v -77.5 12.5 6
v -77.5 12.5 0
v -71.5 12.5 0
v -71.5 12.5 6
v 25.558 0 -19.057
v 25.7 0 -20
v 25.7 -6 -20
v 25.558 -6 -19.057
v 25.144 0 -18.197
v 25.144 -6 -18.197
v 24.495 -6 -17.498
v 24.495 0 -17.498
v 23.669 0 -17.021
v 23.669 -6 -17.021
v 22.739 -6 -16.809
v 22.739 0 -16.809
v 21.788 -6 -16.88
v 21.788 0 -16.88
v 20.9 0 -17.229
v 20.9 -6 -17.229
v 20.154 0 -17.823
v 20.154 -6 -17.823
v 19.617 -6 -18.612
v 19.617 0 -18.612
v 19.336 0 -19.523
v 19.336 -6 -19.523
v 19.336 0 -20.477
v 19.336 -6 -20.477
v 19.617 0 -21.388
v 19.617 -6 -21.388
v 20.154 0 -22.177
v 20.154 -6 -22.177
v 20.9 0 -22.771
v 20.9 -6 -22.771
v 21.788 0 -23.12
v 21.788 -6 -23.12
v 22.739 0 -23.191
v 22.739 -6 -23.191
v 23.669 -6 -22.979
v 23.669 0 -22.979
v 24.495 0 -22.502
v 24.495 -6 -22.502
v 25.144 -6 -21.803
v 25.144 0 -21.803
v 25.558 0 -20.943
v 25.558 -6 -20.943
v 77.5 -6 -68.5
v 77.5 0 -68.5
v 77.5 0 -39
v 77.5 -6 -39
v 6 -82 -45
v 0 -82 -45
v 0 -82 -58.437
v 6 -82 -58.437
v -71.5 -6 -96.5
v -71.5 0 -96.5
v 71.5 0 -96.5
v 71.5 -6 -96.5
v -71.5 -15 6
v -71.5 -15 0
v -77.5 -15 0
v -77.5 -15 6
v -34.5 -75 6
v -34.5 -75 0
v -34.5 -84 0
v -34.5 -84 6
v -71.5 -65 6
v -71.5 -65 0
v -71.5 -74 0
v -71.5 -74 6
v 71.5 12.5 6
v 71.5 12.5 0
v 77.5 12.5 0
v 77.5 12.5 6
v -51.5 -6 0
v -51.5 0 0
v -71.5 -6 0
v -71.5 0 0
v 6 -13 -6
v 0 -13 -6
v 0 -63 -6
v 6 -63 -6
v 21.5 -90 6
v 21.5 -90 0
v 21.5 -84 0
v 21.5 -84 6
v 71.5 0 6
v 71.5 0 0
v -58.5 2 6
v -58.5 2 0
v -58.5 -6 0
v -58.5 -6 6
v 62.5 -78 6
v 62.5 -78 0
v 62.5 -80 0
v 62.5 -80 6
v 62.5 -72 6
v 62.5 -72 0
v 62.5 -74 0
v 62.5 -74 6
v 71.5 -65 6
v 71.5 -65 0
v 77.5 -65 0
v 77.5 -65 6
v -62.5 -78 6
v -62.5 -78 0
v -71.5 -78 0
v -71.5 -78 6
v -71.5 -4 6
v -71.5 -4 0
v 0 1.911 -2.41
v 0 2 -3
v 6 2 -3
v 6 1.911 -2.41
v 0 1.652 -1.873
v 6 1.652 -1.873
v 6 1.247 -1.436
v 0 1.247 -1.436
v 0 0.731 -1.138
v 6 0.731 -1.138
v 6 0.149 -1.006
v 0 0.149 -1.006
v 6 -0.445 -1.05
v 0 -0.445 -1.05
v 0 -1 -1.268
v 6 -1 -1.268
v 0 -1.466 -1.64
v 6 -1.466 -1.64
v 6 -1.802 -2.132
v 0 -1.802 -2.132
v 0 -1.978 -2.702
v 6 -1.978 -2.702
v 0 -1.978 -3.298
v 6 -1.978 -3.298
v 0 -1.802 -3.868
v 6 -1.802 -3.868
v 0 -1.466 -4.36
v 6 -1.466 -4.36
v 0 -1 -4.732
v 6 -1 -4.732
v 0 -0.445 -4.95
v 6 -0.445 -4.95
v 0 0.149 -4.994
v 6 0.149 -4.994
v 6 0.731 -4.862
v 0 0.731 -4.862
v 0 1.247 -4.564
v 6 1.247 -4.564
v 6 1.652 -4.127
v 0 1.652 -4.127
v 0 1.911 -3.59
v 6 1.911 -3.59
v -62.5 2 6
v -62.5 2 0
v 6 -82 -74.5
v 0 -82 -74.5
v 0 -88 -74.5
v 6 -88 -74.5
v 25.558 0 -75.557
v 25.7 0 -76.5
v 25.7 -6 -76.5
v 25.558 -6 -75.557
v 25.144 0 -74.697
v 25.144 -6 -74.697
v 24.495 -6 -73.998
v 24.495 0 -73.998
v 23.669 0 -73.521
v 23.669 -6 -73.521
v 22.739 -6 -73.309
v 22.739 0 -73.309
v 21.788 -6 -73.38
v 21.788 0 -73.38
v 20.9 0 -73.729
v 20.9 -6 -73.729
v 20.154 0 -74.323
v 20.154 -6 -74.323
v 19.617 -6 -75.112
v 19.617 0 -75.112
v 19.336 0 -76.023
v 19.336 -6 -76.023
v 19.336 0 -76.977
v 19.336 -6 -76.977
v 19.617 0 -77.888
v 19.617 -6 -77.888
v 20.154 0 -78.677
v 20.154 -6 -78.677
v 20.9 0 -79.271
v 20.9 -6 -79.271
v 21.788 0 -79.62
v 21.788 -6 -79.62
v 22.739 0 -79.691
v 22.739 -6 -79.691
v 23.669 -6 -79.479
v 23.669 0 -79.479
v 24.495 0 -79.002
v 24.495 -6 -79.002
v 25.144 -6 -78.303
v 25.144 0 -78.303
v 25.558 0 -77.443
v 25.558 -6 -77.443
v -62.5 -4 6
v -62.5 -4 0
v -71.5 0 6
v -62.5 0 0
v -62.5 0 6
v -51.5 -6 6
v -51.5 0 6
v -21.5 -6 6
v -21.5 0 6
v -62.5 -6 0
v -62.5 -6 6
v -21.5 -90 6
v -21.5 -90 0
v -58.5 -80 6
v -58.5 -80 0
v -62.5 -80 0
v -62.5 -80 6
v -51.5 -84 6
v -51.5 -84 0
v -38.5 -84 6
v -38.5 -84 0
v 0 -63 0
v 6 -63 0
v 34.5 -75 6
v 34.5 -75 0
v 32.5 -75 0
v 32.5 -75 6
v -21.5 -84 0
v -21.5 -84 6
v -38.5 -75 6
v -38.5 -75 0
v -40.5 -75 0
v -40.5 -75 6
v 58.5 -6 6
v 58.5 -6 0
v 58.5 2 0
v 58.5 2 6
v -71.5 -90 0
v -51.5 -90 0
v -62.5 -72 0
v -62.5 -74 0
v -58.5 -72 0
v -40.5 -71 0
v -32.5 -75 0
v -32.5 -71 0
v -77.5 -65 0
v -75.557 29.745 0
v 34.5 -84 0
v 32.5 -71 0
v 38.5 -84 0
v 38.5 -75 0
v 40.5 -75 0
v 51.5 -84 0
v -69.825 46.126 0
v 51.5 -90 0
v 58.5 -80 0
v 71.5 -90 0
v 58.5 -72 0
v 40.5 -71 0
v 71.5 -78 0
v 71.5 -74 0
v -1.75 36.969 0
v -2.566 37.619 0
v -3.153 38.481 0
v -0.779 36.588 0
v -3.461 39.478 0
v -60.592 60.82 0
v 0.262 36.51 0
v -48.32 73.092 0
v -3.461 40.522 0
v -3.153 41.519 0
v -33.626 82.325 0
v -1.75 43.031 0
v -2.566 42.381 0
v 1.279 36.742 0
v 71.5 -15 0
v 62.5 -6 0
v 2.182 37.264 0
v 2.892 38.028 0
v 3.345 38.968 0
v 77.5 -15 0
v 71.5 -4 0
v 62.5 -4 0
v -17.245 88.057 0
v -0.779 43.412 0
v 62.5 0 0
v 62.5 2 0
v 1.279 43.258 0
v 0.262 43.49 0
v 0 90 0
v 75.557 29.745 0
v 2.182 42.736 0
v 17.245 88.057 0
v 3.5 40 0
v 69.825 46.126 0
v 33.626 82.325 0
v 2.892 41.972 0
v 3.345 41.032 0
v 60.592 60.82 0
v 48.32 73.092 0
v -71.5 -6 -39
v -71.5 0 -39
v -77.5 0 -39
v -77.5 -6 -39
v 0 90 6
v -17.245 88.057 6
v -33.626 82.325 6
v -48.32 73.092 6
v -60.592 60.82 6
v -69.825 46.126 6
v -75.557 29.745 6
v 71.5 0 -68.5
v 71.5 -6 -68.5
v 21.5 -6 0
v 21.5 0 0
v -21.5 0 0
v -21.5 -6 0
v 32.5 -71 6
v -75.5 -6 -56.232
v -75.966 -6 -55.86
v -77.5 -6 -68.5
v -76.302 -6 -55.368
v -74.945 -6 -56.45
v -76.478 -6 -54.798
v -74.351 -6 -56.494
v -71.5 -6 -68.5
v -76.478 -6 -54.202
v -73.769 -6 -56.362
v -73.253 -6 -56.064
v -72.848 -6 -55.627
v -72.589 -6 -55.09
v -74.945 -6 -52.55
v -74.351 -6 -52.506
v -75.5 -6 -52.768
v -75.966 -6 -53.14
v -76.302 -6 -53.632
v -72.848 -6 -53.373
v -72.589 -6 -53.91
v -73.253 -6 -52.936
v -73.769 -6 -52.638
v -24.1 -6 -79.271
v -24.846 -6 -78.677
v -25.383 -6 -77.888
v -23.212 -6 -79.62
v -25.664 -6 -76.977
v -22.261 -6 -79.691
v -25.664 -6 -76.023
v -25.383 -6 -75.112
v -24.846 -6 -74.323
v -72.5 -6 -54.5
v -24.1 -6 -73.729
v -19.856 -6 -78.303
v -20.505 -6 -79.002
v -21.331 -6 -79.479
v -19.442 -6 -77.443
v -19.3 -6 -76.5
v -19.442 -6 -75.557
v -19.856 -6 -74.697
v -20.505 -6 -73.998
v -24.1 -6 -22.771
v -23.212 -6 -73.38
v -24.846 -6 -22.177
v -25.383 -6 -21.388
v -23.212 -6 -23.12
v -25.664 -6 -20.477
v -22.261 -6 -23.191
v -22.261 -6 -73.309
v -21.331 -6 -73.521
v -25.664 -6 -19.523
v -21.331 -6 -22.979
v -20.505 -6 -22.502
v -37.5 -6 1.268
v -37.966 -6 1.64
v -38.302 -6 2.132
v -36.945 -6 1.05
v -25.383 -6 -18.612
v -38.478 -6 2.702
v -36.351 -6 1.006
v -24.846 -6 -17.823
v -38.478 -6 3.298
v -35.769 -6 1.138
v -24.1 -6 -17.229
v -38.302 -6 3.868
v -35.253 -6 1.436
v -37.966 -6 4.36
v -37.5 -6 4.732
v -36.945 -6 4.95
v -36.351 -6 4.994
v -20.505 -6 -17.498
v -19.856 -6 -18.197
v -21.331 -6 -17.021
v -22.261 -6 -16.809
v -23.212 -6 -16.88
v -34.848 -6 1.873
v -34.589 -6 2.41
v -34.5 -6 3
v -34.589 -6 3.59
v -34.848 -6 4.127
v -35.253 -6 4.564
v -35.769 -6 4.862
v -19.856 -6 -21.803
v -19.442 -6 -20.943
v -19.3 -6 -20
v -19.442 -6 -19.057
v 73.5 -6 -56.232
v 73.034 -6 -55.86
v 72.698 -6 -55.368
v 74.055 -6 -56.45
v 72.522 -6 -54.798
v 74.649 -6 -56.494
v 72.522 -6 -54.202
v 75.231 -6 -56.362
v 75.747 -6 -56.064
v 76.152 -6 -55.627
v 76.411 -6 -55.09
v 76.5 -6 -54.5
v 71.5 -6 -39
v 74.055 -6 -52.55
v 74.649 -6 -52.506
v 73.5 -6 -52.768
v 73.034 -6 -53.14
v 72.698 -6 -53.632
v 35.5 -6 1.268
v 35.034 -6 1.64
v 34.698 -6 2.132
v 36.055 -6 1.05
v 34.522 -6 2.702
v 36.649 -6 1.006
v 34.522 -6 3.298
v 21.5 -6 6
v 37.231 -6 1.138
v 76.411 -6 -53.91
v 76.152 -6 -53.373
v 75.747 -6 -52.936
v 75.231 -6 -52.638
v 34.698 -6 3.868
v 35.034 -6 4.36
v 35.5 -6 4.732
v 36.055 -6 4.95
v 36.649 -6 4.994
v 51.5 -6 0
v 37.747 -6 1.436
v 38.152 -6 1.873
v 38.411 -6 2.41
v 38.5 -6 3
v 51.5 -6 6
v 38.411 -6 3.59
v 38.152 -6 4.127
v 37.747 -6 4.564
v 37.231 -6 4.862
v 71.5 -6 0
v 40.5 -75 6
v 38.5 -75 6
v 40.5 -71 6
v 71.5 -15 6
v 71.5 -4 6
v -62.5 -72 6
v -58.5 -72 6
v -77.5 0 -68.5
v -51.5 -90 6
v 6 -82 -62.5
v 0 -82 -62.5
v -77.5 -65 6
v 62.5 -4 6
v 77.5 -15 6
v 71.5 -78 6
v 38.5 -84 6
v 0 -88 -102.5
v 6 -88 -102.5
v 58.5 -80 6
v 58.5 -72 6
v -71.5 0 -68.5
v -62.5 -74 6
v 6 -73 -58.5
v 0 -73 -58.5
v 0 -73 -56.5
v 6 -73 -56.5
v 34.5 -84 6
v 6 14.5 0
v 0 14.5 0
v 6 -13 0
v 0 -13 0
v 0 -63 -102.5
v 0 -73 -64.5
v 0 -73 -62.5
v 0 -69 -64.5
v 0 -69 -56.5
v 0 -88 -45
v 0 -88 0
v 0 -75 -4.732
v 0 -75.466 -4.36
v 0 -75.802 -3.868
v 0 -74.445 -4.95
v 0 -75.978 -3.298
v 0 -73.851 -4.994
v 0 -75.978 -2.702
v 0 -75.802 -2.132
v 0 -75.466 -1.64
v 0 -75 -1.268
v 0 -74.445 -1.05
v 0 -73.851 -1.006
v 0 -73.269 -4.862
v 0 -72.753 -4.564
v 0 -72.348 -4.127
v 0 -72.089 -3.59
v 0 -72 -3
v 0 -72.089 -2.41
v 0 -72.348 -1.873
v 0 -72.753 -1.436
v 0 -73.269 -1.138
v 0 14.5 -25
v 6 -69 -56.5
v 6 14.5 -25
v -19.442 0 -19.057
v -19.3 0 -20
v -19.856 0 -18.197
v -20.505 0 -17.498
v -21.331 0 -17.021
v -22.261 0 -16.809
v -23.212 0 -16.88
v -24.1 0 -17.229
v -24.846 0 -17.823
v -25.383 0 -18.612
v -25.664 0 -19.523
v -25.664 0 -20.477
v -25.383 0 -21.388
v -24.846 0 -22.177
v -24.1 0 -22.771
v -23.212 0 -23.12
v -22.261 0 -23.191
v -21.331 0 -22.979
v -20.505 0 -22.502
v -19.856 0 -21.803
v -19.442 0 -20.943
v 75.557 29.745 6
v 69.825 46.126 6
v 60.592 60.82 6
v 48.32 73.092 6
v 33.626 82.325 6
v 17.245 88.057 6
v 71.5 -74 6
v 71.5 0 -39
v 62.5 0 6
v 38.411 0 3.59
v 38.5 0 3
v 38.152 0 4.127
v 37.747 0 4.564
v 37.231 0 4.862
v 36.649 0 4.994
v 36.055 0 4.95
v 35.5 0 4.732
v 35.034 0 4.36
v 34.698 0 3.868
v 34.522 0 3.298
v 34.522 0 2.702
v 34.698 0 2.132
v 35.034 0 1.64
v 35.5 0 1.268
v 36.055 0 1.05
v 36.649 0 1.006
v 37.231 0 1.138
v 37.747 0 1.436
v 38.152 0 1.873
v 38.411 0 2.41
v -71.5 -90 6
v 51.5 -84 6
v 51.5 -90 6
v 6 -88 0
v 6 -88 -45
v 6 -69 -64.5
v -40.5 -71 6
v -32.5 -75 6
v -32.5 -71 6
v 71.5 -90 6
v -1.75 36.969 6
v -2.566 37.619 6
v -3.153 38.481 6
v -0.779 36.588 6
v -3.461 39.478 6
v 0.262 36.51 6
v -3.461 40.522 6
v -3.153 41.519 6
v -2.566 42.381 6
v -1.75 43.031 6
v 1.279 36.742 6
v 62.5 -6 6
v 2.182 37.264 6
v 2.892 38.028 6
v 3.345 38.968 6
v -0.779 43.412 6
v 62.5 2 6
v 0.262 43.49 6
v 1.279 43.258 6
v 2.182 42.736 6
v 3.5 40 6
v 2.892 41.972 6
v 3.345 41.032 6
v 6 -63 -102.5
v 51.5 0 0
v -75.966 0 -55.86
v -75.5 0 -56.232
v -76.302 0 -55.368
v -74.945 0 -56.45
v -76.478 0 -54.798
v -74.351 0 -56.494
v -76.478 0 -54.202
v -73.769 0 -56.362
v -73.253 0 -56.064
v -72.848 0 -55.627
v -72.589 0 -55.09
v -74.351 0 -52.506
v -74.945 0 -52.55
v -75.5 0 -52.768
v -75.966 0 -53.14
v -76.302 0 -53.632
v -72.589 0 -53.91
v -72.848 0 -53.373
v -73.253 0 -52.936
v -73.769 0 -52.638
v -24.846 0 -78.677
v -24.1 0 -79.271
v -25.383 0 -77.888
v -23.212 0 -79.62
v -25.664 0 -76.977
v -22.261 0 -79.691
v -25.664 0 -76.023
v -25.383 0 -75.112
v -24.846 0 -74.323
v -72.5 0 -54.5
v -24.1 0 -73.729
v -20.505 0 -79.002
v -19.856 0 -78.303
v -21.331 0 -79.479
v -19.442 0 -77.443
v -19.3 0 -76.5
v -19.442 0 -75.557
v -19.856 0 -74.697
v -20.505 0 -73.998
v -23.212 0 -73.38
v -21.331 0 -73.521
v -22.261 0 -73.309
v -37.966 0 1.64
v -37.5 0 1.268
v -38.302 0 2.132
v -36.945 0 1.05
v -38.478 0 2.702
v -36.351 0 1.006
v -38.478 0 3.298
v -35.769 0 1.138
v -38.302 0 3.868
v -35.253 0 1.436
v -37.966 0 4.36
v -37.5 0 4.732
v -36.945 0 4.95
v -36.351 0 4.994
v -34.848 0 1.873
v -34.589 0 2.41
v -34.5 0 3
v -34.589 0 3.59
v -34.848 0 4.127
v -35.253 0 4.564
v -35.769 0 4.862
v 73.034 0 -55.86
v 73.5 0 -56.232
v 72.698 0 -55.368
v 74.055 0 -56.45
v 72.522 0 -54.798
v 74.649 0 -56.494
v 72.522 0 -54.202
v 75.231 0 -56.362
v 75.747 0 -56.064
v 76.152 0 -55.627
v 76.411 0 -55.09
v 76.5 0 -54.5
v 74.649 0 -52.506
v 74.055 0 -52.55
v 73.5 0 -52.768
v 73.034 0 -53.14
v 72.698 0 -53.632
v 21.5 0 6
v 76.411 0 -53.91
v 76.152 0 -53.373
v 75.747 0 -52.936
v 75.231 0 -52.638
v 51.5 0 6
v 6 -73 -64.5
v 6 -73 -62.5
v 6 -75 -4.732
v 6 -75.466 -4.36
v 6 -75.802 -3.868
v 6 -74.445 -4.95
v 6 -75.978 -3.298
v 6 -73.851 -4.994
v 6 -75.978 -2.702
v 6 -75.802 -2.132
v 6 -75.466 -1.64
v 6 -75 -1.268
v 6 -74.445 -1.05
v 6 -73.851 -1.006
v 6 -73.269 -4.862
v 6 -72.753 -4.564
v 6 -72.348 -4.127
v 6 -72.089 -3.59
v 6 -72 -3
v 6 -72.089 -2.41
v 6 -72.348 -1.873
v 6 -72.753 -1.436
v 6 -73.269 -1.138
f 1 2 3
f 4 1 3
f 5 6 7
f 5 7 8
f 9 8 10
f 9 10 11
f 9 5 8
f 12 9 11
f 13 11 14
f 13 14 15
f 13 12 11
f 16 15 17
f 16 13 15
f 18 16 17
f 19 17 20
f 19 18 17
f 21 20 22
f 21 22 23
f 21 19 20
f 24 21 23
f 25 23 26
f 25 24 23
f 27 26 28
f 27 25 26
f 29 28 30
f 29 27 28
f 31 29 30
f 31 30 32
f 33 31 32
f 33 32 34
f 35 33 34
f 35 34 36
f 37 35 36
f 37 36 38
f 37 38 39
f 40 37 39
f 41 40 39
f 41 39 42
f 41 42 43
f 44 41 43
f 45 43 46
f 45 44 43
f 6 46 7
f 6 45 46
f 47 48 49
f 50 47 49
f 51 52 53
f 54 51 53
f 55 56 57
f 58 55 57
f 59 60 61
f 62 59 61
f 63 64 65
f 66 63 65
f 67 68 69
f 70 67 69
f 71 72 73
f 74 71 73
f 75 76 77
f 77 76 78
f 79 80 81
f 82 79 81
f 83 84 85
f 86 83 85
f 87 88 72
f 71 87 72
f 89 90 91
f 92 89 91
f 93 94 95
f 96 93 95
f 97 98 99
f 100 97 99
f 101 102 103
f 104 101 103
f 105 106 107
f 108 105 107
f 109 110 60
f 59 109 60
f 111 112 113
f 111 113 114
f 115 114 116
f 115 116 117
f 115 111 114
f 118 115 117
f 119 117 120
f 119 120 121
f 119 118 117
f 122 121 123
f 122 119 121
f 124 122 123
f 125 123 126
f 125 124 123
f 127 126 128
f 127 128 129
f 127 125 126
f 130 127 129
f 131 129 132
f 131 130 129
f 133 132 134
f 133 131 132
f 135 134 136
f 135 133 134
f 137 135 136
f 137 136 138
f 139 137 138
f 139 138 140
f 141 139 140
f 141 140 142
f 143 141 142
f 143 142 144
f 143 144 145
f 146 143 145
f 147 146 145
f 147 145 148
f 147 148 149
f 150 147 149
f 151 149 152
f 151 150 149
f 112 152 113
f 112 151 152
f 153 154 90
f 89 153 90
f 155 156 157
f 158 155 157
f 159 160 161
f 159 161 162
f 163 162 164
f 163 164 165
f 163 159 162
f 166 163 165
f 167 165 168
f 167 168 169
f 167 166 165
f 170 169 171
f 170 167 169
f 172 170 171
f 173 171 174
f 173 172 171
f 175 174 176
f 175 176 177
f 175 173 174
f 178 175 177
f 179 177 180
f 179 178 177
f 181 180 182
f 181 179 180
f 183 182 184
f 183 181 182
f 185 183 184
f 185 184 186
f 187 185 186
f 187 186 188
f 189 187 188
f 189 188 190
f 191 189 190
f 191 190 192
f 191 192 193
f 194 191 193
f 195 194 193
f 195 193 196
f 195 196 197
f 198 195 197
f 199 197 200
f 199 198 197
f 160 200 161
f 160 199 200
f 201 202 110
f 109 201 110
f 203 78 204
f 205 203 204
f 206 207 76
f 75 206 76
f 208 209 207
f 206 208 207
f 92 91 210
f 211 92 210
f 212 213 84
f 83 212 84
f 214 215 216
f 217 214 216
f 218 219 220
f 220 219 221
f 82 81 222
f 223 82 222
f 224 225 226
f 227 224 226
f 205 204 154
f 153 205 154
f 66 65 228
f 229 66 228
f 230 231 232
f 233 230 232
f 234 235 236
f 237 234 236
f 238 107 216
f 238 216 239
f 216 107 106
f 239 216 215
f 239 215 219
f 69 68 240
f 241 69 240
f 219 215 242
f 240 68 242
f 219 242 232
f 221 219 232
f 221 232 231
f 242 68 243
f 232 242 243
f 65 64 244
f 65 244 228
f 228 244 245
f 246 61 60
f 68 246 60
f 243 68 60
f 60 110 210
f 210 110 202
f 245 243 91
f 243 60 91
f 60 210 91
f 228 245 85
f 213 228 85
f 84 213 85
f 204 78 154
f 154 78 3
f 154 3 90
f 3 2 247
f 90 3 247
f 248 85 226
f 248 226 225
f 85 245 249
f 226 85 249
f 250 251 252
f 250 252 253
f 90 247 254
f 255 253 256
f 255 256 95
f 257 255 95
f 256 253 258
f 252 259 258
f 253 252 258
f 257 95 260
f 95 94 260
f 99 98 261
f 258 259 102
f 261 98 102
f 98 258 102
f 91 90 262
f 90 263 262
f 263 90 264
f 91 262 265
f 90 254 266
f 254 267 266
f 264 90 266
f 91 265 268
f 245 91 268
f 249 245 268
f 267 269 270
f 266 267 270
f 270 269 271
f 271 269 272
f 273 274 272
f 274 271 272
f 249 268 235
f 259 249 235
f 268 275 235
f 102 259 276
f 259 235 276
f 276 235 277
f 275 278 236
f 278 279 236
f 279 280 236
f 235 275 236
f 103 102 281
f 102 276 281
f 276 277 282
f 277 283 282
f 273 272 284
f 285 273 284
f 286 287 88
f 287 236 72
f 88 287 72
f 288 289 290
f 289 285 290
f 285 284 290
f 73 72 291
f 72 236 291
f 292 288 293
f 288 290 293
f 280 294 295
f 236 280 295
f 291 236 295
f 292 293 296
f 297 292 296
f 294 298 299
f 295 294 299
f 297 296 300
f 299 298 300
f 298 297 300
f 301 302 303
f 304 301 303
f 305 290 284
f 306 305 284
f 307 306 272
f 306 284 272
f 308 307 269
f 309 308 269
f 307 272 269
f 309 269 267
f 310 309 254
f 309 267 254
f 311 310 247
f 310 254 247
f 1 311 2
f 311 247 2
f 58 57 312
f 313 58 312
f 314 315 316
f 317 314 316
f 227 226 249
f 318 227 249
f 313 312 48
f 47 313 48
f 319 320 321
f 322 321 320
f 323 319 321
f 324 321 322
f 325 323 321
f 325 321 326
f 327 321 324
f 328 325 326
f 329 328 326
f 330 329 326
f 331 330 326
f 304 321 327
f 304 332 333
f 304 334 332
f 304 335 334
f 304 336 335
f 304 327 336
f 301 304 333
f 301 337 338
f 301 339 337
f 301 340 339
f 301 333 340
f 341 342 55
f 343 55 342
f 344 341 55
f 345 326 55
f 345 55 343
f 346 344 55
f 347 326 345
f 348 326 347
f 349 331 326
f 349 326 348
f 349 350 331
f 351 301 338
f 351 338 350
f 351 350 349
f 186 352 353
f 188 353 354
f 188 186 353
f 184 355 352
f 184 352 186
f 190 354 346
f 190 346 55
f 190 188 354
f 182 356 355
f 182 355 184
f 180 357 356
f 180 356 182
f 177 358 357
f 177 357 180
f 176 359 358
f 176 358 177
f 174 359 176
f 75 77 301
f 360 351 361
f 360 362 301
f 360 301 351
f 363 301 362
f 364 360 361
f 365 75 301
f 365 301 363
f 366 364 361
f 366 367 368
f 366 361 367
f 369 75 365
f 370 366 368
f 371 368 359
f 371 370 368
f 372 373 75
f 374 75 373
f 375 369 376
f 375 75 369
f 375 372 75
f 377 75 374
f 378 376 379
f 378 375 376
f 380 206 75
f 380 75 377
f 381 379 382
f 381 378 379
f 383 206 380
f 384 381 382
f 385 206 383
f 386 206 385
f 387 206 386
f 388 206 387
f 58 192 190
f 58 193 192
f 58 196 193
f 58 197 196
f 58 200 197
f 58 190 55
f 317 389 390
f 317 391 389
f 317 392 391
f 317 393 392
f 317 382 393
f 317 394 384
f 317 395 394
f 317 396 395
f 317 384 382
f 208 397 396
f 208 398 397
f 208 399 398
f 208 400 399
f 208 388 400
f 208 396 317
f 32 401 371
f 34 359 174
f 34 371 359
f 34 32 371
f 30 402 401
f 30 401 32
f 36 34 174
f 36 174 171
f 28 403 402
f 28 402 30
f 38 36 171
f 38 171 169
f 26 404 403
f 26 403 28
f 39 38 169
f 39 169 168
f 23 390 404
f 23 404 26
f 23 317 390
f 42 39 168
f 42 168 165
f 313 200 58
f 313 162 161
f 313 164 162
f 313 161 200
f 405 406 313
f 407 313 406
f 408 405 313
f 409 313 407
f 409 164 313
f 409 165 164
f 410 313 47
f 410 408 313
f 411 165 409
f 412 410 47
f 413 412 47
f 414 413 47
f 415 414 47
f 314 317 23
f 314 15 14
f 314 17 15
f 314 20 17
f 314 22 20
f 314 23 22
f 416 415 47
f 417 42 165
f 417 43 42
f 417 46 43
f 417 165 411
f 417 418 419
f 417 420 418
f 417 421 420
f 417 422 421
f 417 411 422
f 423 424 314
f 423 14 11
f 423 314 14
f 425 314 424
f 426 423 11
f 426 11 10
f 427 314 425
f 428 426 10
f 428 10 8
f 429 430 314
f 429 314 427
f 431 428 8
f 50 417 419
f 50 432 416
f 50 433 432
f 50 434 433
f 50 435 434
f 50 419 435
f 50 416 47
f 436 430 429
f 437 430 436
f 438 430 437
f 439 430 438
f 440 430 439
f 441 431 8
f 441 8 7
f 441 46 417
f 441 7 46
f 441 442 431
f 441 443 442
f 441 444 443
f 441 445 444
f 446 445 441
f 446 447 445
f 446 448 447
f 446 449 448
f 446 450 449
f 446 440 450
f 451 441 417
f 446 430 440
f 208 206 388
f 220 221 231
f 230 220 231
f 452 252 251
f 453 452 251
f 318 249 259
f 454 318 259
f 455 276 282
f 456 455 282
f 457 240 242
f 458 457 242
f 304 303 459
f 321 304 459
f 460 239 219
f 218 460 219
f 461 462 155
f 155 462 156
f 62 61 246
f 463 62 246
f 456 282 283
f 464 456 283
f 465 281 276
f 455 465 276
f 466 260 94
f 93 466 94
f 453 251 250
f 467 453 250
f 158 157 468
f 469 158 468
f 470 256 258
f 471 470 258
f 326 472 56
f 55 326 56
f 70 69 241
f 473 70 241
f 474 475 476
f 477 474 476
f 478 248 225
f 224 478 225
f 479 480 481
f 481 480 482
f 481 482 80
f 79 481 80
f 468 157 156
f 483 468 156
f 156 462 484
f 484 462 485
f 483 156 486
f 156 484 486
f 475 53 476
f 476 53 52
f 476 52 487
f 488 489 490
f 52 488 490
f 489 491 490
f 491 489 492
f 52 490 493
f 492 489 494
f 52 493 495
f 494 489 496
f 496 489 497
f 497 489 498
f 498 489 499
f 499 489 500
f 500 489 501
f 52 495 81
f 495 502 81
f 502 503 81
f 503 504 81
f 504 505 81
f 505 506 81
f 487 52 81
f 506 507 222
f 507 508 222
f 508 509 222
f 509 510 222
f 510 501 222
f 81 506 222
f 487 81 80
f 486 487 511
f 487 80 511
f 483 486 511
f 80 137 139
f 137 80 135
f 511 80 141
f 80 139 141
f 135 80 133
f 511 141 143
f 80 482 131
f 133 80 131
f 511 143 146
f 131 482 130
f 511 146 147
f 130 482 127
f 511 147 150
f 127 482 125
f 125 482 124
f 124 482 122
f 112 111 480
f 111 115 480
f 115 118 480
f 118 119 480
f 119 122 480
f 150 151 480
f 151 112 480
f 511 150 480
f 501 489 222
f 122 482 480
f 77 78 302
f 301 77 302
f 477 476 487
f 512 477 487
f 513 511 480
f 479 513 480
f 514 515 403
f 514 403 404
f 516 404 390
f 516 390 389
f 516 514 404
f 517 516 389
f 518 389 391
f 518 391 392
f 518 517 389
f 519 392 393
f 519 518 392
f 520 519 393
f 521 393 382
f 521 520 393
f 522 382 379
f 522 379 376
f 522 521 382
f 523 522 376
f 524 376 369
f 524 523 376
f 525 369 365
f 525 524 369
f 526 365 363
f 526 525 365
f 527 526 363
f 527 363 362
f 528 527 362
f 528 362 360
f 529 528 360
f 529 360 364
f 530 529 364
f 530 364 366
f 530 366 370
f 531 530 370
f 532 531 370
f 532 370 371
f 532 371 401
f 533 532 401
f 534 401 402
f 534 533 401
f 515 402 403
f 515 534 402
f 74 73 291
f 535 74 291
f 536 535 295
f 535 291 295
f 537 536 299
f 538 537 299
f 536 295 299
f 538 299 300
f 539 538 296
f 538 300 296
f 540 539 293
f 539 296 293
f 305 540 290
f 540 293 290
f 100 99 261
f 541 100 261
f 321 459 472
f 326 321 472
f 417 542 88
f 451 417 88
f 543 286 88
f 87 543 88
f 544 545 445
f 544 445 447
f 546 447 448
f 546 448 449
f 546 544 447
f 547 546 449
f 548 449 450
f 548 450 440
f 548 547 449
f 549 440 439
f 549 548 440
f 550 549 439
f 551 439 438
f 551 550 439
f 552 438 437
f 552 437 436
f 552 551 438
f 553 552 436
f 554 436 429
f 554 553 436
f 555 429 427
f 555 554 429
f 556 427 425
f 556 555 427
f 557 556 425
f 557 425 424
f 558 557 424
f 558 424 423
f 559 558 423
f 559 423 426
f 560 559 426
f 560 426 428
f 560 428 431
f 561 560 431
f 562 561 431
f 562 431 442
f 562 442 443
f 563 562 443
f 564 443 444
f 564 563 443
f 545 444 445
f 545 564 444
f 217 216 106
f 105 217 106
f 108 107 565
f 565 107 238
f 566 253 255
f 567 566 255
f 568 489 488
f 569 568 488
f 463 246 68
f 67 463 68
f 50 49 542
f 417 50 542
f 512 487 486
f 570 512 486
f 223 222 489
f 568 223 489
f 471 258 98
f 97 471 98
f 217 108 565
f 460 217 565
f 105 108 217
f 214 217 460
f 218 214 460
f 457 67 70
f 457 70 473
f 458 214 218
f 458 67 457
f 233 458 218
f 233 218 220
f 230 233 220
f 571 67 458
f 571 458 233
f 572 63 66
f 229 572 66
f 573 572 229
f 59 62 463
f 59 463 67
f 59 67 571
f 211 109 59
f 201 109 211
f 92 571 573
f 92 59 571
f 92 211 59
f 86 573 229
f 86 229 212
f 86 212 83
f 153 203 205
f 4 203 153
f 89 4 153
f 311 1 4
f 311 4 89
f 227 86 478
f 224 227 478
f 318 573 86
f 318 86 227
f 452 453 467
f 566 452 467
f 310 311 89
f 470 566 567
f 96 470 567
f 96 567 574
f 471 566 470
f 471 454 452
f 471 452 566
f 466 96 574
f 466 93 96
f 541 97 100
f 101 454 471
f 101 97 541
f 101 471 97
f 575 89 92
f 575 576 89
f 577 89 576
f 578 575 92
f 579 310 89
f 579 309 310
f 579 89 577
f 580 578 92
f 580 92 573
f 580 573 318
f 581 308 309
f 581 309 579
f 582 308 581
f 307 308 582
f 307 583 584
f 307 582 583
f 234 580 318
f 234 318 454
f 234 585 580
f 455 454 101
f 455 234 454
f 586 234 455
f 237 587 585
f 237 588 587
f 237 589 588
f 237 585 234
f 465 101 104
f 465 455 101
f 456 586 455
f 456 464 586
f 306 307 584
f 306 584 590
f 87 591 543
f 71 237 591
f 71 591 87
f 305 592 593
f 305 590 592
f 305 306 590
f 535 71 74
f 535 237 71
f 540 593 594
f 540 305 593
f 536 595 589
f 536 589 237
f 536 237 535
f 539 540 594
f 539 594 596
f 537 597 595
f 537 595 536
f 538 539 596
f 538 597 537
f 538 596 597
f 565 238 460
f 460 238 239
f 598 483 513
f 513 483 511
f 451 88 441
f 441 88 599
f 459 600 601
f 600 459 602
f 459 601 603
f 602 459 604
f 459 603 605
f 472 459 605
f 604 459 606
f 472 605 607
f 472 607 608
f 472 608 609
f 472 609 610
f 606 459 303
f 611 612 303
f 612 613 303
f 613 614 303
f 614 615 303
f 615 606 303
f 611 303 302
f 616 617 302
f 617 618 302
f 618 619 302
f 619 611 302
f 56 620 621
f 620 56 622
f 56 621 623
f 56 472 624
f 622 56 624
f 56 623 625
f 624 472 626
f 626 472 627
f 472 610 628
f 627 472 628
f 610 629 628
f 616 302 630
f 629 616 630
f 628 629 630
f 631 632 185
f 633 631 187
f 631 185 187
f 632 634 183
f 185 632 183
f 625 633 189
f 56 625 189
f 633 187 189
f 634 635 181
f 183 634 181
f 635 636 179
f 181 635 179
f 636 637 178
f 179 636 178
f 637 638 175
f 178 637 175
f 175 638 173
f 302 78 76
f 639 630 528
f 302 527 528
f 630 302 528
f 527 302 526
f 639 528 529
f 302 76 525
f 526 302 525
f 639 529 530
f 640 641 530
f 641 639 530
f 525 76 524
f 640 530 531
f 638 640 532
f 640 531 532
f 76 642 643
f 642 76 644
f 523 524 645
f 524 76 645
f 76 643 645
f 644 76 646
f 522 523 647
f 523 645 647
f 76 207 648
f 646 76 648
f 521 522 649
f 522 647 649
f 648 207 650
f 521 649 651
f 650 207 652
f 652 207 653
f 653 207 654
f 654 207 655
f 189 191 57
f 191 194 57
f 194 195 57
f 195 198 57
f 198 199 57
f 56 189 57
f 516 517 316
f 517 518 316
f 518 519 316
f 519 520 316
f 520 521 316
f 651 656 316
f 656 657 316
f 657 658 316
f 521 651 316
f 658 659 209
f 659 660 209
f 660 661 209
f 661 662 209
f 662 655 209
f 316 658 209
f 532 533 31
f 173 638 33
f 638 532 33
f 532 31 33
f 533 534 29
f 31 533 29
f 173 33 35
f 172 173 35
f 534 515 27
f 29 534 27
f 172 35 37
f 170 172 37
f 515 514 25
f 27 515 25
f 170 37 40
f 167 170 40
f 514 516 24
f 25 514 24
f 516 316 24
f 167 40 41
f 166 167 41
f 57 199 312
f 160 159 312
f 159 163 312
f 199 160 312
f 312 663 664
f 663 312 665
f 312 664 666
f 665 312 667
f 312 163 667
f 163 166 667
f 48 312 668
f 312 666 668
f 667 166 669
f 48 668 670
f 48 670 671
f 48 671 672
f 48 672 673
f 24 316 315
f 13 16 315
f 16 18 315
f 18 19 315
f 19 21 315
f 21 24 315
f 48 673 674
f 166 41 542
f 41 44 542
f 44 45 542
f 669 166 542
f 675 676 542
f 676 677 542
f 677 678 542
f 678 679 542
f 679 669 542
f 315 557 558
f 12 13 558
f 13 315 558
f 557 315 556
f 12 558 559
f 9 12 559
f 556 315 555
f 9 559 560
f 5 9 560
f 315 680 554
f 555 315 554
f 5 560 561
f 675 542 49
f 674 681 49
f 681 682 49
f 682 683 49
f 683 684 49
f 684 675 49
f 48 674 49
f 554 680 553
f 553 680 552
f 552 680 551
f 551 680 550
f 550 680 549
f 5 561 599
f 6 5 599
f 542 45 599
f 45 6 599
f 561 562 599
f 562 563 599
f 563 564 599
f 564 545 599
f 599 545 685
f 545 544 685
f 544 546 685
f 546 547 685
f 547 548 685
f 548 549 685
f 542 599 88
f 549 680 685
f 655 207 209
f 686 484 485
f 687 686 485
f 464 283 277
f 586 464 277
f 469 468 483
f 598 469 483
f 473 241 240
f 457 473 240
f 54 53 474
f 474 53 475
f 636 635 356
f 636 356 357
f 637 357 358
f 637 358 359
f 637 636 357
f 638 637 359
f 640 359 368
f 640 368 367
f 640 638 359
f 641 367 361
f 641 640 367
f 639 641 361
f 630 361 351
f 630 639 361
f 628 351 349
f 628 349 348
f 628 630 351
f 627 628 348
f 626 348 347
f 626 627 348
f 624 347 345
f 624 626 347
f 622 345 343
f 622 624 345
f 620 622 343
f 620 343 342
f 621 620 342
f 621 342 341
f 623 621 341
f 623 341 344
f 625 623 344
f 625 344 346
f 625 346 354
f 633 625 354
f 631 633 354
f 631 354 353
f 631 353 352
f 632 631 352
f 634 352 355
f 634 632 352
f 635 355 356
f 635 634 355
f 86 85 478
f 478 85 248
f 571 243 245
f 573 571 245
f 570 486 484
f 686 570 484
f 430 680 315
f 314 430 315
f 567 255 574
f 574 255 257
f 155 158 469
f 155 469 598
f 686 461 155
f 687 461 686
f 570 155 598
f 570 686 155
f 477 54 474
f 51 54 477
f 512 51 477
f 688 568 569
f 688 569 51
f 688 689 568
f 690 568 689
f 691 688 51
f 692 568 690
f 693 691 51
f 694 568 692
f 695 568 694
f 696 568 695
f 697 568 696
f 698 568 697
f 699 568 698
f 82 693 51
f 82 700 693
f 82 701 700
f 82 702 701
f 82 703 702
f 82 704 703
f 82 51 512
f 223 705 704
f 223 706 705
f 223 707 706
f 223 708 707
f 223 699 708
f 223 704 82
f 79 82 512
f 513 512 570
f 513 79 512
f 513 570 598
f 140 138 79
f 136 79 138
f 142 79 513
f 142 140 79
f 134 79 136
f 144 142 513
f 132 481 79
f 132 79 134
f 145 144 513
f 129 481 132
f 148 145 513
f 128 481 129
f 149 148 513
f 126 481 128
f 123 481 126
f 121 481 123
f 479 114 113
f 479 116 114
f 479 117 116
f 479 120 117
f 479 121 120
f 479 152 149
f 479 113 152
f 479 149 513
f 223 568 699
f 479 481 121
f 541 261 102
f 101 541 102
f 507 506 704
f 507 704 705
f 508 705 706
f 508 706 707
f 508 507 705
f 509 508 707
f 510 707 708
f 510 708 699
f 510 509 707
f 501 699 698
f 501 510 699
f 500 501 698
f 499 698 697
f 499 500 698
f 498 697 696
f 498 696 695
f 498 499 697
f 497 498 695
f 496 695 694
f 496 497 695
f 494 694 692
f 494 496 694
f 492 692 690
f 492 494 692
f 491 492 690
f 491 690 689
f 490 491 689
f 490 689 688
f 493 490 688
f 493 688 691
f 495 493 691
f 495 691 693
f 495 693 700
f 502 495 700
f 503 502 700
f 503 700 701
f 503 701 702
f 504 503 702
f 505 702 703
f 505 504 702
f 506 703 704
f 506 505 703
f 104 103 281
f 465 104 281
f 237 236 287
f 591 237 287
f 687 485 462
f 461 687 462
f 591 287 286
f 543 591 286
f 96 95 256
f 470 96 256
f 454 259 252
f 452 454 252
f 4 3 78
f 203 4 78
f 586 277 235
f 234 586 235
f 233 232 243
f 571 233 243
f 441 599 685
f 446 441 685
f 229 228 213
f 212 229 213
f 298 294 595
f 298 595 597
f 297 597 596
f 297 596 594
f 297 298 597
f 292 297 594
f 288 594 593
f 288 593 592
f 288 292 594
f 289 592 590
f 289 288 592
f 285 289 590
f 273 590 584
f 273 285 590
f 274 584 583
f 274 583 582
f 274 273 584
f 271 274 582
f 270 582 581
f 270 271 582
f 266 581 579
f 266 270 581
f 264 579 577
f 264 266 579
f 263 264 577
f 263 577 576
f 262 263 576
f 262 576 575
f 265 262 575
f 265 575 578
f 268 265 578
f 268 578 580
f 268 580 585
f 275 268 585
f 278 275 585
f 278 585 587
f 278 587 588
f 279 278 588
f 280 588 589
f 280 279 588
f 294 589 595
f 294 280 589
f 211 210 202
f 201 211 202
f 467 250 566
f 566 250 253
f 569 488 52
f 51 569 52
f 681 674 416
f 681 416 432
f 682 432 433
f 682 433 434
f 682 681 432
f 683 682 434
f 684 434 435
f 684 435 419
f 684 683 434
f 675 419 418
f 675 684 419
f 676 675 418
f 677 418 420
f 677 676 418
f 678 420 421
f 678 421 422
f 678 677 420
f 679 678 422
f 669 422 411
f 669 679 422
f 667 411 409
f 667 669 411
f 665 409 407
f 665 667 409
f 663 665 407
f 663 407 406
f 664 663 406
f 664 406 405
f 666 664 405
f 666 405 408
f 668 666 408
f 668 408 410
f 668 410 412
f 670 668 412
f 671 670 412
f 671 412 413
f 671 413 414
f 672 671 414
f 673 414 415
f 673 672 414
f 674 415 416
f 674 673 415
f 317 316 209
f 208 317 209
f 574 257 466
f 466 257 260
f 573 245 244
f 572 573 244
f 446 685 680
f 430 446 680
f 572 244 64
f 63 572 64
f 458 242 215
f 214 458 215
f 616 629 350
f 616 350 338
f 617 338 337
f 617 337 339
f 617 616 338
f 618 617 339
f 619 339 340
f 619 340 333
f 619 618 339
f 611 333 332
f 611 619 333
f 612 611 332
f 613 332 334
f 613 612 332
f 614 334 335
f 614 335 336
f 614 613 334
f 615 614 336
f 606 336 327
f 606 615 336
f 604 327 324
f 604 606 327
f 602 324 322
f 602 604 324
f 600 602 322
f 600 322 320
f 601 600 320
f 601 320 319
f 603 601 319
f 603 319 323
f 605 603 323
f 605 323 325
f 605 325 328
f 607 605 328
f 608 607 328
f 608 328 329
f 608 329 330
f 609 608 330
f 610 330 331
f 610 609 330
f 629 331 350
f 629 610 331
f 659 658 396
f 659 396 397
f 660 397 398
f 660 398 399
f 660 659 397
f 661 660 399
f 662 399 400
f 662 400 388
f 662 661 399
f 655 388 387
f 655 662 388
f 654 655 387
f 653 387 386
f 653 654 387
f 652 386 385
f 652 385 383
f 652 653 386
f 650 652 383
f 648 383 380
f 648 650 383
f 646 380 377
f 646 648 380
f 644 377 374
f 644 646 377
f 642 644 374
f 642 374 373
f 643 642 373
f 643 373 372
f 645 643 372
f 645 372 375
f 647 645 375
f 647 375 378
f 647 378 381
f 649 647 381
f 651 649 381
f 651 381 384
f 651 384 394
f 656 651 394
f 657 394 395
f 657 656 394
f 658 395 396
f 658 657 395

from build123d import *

# Parameters (mm, degrees)
F0_R     = 3.5
F2_DEPTH = 6
F1_R     = 2
F4_DEPTH = 6
F3_R     = 3.2
F3_R_2   = 2
F5_DEPTH = 6


with BuildPart() as f2:
    # F0 (on Top) → F2 (new body)
    with BuildSketch(Plane.XY):
        with BuildLine():
            ThreePointArc((77.5, 12.5), (54.800776, 67.300776), (0, 90))
            ThreePointArc((0, 90), (-54.800776, 67.300776), (-77.5, 12.5))
            Line((-77.5, 12.5), (-71.5, 12.5))
            Line((-71.5, 12.5), (-71.5, 0))
            Line((-71.5, 0), (-62.5, 0))
            Line((-62.5, 0), (-62.5, 2))
            Line((-62.5, 2), (-58.5, 2))
            Line((-58.5, 2), (-58.5, -6))
            Line((-58.5, -6), (-62.5, -6))
            Line((-62.5, -6), (-62.5, -4))
            Line((-62.5, -4), (-71.5, -4))
            Line((-71.5, -4), (-71.5, -15))
            Line((-71.5, -15), (-77.5, -15))
            Line((-77.5, -15), (-77.5, -65))
            Line((-77.5, -65), (-71.5, -65))
            Line((-71.5, -65), (-71.5, -74))
            Line((-71.5, -74), (-62.5, -74))
            Line((-62.5, -74), (-62.5, -72))
            Line((-62.5, -72), (-58.5, -72))
            Line((-58.5, -72), (-58.5, -80))
            Line((-58.5, -80), (-62.5, -80))
            Line((-62.5, -80), (-62.5, -78))
            Line((-62.5, -78), (-71.5, -78))
            Line((-71.5, -78), (-71.5, -90))
            Line((-71.5, -90), (-51.5, -90))
            Line((-51.5, -90), (-51.5, -84))
            Line((-51.5, -84), (-38.5, -84))
            Line((-38.5, -84), (-38.5, -75))
            Line((-38.5, -75), (-40.5, -75))
            Line((-40.5, -75), (-40.5, -71))
            Line((-40.5, -71), (-32.5, -71))
            Line((-32.5, -71), (-32.5, -75))
            Line((-32.5, -75), (-34.5, -75))
            Line((-34.5, -75), (-34.5, -84))
            Line((-34.5, -84), (-21.5, -84))
            Line((-21.5, -84), (-21.5, -90))
            Line((-21.5, -90), (0, -90))
            Line((0, -90), (21.5, -90))
            Line((21.5, -90), (21.5, -84))
            Line((21.5, -84), (34.5, -84))
            Line((34.5, -84), (34.5, -75))
            Line((34.5, -75), (32.5, -75))
            Line((32.5, -75), (32.5, -71))
            Line((32.5, -71), (40.5, -71))
            Line((40.5, -71), (40.5, -75))
            Line((40.5, -75), (38.5, -75))
            Line((38.5, -75), (38.5, -84))
            Line((38.5, -84), (51.5, -84))
            Line((51.5, -84), (51.5, -90))
            Line((51.5, -90), (71.5, -90))
            Line((71.5, -90), (71.5, -78))
            Line((71.5, -78), (62.5, -78))
            Line((62.5, -78), (62.5, -80))
            Line((62.5, -80), (58.5, -80))
            Line((58.5, -80), (58.5, -72))
            Line((58.5, -72), (62.5, -72))
            Line((62.5, -72), (62.5, -74))
            Line((62.5, -74), (71.5, -74))
            Line((71.5, -74), (71.5, -65))
            Line((71.5, -65), (77.5, -65))
            Line((77.5, -65), (77.5, -15))
            Line((77.5, -15), (71.5, -15))
            Line((71.5, -15), (71.5, -4))
            Line((71.5, -4), (62.5, -4))
            Line((62.5, -4), (62.5, -6))
            Line((62.5, -6), (58.5, -6))
            Line((58.5, -6), (58.5, 2))
            Line((58.5, 2), (62.5, 2))
            Line((62.5, 2), (62.5, 0))
            Line((62.5, 0), (71.5, 0))
            Line((71.5, 0), (71.5, 12.5))
            Line((71.5, 12.5), (77.5, 12.5))
        make_face()
        with Locations((0, 40)):
            Circle(F0_R, mode=Mode.SUBTRACT)
    extrude(amount=F2_DEPTH)


with BuildPart() as f4:
    # F1 (on Right) → F4 (new body)
    with BuildSketch(Plane.YZ):
        Polygon((-63, 0), (-88, 0), (-88, -45), (-82, -45), (-82, -58.436746), (-73.000222, -58.5), (-73.000222, -56.5), (-69, -56.5), (-69, -64.5), (-73, -64.5), (-73, -62.5), (-82, -62.5), (-82, -74.5), (-88, -74.5), (-88, -102.5), (-63, -102.5), (14.5, -25), (14.5, 0), (-13, 0), (-13, -6), (-63, -6), align=None)
        with Locations((-74, -3)):
            Circle(F1_R, mode=Mode.SUBTRACT)
        with Locations((0, -3)):
            Circle(F1_R, mode=Mode.SUBTRACT)
    extrude(amount=F4_DEPTH)


with BuildPart() as f5:
    # F3 (on Front) → F5 (new body)
    with BuildSketch(Plane.XZ):
        Polygon((-71.5, -68.5), (-71.5, -96.5), (71.5, -96.5), (71.5, -68.5), (77.5, -68.5), (77.5, -39), (71.5, -39), (71.5, 0), (51.5, 0), (51.5, 6), (21.5, 6), (21.5, 0), (-21.5, 0), (-21.5, 6), (-51.5, 6), (-51.5, 0), (-71.5, 0), (-71.5, -39), (-77.5, -39), (-77.5, -68.5), align=None)
        with Locations((-22.5, -76.5)):
            Circle(F3_R, mode=Mode.SUBTRACT)
        with Locations((-74.5, -54.5)):
            Circle(F3_R_2, mode=Mode.SUBTRACT)
        with Locations((22.5, -76.5)):
            Circle(F3_R, mode=Mode.SUBTRACT)
        with Locations((74.5, -54.5)):
            Circle(F3_R_2, mode=Mode.SUBTRACT)
        with Locations((-22.5, -20)):
            Circle(F3_R, mode=Mode.SUBTRACT)
        with Locations((-36.5, 3)):
            Circle(F3_R_2, mode=Mode.SUBTRACT)
        with Locations((22.5, -20)):
            Circle(F3_R, mode=Mode.SUBTRACT)
        with Locations((36.5, 3)):
            Circle(F3_R_2, mode=Mode.SUBTRACT)
    extrude(amount=F5_DEPTH)


solid = Compound([f2.part, f4.part, f5.part])
